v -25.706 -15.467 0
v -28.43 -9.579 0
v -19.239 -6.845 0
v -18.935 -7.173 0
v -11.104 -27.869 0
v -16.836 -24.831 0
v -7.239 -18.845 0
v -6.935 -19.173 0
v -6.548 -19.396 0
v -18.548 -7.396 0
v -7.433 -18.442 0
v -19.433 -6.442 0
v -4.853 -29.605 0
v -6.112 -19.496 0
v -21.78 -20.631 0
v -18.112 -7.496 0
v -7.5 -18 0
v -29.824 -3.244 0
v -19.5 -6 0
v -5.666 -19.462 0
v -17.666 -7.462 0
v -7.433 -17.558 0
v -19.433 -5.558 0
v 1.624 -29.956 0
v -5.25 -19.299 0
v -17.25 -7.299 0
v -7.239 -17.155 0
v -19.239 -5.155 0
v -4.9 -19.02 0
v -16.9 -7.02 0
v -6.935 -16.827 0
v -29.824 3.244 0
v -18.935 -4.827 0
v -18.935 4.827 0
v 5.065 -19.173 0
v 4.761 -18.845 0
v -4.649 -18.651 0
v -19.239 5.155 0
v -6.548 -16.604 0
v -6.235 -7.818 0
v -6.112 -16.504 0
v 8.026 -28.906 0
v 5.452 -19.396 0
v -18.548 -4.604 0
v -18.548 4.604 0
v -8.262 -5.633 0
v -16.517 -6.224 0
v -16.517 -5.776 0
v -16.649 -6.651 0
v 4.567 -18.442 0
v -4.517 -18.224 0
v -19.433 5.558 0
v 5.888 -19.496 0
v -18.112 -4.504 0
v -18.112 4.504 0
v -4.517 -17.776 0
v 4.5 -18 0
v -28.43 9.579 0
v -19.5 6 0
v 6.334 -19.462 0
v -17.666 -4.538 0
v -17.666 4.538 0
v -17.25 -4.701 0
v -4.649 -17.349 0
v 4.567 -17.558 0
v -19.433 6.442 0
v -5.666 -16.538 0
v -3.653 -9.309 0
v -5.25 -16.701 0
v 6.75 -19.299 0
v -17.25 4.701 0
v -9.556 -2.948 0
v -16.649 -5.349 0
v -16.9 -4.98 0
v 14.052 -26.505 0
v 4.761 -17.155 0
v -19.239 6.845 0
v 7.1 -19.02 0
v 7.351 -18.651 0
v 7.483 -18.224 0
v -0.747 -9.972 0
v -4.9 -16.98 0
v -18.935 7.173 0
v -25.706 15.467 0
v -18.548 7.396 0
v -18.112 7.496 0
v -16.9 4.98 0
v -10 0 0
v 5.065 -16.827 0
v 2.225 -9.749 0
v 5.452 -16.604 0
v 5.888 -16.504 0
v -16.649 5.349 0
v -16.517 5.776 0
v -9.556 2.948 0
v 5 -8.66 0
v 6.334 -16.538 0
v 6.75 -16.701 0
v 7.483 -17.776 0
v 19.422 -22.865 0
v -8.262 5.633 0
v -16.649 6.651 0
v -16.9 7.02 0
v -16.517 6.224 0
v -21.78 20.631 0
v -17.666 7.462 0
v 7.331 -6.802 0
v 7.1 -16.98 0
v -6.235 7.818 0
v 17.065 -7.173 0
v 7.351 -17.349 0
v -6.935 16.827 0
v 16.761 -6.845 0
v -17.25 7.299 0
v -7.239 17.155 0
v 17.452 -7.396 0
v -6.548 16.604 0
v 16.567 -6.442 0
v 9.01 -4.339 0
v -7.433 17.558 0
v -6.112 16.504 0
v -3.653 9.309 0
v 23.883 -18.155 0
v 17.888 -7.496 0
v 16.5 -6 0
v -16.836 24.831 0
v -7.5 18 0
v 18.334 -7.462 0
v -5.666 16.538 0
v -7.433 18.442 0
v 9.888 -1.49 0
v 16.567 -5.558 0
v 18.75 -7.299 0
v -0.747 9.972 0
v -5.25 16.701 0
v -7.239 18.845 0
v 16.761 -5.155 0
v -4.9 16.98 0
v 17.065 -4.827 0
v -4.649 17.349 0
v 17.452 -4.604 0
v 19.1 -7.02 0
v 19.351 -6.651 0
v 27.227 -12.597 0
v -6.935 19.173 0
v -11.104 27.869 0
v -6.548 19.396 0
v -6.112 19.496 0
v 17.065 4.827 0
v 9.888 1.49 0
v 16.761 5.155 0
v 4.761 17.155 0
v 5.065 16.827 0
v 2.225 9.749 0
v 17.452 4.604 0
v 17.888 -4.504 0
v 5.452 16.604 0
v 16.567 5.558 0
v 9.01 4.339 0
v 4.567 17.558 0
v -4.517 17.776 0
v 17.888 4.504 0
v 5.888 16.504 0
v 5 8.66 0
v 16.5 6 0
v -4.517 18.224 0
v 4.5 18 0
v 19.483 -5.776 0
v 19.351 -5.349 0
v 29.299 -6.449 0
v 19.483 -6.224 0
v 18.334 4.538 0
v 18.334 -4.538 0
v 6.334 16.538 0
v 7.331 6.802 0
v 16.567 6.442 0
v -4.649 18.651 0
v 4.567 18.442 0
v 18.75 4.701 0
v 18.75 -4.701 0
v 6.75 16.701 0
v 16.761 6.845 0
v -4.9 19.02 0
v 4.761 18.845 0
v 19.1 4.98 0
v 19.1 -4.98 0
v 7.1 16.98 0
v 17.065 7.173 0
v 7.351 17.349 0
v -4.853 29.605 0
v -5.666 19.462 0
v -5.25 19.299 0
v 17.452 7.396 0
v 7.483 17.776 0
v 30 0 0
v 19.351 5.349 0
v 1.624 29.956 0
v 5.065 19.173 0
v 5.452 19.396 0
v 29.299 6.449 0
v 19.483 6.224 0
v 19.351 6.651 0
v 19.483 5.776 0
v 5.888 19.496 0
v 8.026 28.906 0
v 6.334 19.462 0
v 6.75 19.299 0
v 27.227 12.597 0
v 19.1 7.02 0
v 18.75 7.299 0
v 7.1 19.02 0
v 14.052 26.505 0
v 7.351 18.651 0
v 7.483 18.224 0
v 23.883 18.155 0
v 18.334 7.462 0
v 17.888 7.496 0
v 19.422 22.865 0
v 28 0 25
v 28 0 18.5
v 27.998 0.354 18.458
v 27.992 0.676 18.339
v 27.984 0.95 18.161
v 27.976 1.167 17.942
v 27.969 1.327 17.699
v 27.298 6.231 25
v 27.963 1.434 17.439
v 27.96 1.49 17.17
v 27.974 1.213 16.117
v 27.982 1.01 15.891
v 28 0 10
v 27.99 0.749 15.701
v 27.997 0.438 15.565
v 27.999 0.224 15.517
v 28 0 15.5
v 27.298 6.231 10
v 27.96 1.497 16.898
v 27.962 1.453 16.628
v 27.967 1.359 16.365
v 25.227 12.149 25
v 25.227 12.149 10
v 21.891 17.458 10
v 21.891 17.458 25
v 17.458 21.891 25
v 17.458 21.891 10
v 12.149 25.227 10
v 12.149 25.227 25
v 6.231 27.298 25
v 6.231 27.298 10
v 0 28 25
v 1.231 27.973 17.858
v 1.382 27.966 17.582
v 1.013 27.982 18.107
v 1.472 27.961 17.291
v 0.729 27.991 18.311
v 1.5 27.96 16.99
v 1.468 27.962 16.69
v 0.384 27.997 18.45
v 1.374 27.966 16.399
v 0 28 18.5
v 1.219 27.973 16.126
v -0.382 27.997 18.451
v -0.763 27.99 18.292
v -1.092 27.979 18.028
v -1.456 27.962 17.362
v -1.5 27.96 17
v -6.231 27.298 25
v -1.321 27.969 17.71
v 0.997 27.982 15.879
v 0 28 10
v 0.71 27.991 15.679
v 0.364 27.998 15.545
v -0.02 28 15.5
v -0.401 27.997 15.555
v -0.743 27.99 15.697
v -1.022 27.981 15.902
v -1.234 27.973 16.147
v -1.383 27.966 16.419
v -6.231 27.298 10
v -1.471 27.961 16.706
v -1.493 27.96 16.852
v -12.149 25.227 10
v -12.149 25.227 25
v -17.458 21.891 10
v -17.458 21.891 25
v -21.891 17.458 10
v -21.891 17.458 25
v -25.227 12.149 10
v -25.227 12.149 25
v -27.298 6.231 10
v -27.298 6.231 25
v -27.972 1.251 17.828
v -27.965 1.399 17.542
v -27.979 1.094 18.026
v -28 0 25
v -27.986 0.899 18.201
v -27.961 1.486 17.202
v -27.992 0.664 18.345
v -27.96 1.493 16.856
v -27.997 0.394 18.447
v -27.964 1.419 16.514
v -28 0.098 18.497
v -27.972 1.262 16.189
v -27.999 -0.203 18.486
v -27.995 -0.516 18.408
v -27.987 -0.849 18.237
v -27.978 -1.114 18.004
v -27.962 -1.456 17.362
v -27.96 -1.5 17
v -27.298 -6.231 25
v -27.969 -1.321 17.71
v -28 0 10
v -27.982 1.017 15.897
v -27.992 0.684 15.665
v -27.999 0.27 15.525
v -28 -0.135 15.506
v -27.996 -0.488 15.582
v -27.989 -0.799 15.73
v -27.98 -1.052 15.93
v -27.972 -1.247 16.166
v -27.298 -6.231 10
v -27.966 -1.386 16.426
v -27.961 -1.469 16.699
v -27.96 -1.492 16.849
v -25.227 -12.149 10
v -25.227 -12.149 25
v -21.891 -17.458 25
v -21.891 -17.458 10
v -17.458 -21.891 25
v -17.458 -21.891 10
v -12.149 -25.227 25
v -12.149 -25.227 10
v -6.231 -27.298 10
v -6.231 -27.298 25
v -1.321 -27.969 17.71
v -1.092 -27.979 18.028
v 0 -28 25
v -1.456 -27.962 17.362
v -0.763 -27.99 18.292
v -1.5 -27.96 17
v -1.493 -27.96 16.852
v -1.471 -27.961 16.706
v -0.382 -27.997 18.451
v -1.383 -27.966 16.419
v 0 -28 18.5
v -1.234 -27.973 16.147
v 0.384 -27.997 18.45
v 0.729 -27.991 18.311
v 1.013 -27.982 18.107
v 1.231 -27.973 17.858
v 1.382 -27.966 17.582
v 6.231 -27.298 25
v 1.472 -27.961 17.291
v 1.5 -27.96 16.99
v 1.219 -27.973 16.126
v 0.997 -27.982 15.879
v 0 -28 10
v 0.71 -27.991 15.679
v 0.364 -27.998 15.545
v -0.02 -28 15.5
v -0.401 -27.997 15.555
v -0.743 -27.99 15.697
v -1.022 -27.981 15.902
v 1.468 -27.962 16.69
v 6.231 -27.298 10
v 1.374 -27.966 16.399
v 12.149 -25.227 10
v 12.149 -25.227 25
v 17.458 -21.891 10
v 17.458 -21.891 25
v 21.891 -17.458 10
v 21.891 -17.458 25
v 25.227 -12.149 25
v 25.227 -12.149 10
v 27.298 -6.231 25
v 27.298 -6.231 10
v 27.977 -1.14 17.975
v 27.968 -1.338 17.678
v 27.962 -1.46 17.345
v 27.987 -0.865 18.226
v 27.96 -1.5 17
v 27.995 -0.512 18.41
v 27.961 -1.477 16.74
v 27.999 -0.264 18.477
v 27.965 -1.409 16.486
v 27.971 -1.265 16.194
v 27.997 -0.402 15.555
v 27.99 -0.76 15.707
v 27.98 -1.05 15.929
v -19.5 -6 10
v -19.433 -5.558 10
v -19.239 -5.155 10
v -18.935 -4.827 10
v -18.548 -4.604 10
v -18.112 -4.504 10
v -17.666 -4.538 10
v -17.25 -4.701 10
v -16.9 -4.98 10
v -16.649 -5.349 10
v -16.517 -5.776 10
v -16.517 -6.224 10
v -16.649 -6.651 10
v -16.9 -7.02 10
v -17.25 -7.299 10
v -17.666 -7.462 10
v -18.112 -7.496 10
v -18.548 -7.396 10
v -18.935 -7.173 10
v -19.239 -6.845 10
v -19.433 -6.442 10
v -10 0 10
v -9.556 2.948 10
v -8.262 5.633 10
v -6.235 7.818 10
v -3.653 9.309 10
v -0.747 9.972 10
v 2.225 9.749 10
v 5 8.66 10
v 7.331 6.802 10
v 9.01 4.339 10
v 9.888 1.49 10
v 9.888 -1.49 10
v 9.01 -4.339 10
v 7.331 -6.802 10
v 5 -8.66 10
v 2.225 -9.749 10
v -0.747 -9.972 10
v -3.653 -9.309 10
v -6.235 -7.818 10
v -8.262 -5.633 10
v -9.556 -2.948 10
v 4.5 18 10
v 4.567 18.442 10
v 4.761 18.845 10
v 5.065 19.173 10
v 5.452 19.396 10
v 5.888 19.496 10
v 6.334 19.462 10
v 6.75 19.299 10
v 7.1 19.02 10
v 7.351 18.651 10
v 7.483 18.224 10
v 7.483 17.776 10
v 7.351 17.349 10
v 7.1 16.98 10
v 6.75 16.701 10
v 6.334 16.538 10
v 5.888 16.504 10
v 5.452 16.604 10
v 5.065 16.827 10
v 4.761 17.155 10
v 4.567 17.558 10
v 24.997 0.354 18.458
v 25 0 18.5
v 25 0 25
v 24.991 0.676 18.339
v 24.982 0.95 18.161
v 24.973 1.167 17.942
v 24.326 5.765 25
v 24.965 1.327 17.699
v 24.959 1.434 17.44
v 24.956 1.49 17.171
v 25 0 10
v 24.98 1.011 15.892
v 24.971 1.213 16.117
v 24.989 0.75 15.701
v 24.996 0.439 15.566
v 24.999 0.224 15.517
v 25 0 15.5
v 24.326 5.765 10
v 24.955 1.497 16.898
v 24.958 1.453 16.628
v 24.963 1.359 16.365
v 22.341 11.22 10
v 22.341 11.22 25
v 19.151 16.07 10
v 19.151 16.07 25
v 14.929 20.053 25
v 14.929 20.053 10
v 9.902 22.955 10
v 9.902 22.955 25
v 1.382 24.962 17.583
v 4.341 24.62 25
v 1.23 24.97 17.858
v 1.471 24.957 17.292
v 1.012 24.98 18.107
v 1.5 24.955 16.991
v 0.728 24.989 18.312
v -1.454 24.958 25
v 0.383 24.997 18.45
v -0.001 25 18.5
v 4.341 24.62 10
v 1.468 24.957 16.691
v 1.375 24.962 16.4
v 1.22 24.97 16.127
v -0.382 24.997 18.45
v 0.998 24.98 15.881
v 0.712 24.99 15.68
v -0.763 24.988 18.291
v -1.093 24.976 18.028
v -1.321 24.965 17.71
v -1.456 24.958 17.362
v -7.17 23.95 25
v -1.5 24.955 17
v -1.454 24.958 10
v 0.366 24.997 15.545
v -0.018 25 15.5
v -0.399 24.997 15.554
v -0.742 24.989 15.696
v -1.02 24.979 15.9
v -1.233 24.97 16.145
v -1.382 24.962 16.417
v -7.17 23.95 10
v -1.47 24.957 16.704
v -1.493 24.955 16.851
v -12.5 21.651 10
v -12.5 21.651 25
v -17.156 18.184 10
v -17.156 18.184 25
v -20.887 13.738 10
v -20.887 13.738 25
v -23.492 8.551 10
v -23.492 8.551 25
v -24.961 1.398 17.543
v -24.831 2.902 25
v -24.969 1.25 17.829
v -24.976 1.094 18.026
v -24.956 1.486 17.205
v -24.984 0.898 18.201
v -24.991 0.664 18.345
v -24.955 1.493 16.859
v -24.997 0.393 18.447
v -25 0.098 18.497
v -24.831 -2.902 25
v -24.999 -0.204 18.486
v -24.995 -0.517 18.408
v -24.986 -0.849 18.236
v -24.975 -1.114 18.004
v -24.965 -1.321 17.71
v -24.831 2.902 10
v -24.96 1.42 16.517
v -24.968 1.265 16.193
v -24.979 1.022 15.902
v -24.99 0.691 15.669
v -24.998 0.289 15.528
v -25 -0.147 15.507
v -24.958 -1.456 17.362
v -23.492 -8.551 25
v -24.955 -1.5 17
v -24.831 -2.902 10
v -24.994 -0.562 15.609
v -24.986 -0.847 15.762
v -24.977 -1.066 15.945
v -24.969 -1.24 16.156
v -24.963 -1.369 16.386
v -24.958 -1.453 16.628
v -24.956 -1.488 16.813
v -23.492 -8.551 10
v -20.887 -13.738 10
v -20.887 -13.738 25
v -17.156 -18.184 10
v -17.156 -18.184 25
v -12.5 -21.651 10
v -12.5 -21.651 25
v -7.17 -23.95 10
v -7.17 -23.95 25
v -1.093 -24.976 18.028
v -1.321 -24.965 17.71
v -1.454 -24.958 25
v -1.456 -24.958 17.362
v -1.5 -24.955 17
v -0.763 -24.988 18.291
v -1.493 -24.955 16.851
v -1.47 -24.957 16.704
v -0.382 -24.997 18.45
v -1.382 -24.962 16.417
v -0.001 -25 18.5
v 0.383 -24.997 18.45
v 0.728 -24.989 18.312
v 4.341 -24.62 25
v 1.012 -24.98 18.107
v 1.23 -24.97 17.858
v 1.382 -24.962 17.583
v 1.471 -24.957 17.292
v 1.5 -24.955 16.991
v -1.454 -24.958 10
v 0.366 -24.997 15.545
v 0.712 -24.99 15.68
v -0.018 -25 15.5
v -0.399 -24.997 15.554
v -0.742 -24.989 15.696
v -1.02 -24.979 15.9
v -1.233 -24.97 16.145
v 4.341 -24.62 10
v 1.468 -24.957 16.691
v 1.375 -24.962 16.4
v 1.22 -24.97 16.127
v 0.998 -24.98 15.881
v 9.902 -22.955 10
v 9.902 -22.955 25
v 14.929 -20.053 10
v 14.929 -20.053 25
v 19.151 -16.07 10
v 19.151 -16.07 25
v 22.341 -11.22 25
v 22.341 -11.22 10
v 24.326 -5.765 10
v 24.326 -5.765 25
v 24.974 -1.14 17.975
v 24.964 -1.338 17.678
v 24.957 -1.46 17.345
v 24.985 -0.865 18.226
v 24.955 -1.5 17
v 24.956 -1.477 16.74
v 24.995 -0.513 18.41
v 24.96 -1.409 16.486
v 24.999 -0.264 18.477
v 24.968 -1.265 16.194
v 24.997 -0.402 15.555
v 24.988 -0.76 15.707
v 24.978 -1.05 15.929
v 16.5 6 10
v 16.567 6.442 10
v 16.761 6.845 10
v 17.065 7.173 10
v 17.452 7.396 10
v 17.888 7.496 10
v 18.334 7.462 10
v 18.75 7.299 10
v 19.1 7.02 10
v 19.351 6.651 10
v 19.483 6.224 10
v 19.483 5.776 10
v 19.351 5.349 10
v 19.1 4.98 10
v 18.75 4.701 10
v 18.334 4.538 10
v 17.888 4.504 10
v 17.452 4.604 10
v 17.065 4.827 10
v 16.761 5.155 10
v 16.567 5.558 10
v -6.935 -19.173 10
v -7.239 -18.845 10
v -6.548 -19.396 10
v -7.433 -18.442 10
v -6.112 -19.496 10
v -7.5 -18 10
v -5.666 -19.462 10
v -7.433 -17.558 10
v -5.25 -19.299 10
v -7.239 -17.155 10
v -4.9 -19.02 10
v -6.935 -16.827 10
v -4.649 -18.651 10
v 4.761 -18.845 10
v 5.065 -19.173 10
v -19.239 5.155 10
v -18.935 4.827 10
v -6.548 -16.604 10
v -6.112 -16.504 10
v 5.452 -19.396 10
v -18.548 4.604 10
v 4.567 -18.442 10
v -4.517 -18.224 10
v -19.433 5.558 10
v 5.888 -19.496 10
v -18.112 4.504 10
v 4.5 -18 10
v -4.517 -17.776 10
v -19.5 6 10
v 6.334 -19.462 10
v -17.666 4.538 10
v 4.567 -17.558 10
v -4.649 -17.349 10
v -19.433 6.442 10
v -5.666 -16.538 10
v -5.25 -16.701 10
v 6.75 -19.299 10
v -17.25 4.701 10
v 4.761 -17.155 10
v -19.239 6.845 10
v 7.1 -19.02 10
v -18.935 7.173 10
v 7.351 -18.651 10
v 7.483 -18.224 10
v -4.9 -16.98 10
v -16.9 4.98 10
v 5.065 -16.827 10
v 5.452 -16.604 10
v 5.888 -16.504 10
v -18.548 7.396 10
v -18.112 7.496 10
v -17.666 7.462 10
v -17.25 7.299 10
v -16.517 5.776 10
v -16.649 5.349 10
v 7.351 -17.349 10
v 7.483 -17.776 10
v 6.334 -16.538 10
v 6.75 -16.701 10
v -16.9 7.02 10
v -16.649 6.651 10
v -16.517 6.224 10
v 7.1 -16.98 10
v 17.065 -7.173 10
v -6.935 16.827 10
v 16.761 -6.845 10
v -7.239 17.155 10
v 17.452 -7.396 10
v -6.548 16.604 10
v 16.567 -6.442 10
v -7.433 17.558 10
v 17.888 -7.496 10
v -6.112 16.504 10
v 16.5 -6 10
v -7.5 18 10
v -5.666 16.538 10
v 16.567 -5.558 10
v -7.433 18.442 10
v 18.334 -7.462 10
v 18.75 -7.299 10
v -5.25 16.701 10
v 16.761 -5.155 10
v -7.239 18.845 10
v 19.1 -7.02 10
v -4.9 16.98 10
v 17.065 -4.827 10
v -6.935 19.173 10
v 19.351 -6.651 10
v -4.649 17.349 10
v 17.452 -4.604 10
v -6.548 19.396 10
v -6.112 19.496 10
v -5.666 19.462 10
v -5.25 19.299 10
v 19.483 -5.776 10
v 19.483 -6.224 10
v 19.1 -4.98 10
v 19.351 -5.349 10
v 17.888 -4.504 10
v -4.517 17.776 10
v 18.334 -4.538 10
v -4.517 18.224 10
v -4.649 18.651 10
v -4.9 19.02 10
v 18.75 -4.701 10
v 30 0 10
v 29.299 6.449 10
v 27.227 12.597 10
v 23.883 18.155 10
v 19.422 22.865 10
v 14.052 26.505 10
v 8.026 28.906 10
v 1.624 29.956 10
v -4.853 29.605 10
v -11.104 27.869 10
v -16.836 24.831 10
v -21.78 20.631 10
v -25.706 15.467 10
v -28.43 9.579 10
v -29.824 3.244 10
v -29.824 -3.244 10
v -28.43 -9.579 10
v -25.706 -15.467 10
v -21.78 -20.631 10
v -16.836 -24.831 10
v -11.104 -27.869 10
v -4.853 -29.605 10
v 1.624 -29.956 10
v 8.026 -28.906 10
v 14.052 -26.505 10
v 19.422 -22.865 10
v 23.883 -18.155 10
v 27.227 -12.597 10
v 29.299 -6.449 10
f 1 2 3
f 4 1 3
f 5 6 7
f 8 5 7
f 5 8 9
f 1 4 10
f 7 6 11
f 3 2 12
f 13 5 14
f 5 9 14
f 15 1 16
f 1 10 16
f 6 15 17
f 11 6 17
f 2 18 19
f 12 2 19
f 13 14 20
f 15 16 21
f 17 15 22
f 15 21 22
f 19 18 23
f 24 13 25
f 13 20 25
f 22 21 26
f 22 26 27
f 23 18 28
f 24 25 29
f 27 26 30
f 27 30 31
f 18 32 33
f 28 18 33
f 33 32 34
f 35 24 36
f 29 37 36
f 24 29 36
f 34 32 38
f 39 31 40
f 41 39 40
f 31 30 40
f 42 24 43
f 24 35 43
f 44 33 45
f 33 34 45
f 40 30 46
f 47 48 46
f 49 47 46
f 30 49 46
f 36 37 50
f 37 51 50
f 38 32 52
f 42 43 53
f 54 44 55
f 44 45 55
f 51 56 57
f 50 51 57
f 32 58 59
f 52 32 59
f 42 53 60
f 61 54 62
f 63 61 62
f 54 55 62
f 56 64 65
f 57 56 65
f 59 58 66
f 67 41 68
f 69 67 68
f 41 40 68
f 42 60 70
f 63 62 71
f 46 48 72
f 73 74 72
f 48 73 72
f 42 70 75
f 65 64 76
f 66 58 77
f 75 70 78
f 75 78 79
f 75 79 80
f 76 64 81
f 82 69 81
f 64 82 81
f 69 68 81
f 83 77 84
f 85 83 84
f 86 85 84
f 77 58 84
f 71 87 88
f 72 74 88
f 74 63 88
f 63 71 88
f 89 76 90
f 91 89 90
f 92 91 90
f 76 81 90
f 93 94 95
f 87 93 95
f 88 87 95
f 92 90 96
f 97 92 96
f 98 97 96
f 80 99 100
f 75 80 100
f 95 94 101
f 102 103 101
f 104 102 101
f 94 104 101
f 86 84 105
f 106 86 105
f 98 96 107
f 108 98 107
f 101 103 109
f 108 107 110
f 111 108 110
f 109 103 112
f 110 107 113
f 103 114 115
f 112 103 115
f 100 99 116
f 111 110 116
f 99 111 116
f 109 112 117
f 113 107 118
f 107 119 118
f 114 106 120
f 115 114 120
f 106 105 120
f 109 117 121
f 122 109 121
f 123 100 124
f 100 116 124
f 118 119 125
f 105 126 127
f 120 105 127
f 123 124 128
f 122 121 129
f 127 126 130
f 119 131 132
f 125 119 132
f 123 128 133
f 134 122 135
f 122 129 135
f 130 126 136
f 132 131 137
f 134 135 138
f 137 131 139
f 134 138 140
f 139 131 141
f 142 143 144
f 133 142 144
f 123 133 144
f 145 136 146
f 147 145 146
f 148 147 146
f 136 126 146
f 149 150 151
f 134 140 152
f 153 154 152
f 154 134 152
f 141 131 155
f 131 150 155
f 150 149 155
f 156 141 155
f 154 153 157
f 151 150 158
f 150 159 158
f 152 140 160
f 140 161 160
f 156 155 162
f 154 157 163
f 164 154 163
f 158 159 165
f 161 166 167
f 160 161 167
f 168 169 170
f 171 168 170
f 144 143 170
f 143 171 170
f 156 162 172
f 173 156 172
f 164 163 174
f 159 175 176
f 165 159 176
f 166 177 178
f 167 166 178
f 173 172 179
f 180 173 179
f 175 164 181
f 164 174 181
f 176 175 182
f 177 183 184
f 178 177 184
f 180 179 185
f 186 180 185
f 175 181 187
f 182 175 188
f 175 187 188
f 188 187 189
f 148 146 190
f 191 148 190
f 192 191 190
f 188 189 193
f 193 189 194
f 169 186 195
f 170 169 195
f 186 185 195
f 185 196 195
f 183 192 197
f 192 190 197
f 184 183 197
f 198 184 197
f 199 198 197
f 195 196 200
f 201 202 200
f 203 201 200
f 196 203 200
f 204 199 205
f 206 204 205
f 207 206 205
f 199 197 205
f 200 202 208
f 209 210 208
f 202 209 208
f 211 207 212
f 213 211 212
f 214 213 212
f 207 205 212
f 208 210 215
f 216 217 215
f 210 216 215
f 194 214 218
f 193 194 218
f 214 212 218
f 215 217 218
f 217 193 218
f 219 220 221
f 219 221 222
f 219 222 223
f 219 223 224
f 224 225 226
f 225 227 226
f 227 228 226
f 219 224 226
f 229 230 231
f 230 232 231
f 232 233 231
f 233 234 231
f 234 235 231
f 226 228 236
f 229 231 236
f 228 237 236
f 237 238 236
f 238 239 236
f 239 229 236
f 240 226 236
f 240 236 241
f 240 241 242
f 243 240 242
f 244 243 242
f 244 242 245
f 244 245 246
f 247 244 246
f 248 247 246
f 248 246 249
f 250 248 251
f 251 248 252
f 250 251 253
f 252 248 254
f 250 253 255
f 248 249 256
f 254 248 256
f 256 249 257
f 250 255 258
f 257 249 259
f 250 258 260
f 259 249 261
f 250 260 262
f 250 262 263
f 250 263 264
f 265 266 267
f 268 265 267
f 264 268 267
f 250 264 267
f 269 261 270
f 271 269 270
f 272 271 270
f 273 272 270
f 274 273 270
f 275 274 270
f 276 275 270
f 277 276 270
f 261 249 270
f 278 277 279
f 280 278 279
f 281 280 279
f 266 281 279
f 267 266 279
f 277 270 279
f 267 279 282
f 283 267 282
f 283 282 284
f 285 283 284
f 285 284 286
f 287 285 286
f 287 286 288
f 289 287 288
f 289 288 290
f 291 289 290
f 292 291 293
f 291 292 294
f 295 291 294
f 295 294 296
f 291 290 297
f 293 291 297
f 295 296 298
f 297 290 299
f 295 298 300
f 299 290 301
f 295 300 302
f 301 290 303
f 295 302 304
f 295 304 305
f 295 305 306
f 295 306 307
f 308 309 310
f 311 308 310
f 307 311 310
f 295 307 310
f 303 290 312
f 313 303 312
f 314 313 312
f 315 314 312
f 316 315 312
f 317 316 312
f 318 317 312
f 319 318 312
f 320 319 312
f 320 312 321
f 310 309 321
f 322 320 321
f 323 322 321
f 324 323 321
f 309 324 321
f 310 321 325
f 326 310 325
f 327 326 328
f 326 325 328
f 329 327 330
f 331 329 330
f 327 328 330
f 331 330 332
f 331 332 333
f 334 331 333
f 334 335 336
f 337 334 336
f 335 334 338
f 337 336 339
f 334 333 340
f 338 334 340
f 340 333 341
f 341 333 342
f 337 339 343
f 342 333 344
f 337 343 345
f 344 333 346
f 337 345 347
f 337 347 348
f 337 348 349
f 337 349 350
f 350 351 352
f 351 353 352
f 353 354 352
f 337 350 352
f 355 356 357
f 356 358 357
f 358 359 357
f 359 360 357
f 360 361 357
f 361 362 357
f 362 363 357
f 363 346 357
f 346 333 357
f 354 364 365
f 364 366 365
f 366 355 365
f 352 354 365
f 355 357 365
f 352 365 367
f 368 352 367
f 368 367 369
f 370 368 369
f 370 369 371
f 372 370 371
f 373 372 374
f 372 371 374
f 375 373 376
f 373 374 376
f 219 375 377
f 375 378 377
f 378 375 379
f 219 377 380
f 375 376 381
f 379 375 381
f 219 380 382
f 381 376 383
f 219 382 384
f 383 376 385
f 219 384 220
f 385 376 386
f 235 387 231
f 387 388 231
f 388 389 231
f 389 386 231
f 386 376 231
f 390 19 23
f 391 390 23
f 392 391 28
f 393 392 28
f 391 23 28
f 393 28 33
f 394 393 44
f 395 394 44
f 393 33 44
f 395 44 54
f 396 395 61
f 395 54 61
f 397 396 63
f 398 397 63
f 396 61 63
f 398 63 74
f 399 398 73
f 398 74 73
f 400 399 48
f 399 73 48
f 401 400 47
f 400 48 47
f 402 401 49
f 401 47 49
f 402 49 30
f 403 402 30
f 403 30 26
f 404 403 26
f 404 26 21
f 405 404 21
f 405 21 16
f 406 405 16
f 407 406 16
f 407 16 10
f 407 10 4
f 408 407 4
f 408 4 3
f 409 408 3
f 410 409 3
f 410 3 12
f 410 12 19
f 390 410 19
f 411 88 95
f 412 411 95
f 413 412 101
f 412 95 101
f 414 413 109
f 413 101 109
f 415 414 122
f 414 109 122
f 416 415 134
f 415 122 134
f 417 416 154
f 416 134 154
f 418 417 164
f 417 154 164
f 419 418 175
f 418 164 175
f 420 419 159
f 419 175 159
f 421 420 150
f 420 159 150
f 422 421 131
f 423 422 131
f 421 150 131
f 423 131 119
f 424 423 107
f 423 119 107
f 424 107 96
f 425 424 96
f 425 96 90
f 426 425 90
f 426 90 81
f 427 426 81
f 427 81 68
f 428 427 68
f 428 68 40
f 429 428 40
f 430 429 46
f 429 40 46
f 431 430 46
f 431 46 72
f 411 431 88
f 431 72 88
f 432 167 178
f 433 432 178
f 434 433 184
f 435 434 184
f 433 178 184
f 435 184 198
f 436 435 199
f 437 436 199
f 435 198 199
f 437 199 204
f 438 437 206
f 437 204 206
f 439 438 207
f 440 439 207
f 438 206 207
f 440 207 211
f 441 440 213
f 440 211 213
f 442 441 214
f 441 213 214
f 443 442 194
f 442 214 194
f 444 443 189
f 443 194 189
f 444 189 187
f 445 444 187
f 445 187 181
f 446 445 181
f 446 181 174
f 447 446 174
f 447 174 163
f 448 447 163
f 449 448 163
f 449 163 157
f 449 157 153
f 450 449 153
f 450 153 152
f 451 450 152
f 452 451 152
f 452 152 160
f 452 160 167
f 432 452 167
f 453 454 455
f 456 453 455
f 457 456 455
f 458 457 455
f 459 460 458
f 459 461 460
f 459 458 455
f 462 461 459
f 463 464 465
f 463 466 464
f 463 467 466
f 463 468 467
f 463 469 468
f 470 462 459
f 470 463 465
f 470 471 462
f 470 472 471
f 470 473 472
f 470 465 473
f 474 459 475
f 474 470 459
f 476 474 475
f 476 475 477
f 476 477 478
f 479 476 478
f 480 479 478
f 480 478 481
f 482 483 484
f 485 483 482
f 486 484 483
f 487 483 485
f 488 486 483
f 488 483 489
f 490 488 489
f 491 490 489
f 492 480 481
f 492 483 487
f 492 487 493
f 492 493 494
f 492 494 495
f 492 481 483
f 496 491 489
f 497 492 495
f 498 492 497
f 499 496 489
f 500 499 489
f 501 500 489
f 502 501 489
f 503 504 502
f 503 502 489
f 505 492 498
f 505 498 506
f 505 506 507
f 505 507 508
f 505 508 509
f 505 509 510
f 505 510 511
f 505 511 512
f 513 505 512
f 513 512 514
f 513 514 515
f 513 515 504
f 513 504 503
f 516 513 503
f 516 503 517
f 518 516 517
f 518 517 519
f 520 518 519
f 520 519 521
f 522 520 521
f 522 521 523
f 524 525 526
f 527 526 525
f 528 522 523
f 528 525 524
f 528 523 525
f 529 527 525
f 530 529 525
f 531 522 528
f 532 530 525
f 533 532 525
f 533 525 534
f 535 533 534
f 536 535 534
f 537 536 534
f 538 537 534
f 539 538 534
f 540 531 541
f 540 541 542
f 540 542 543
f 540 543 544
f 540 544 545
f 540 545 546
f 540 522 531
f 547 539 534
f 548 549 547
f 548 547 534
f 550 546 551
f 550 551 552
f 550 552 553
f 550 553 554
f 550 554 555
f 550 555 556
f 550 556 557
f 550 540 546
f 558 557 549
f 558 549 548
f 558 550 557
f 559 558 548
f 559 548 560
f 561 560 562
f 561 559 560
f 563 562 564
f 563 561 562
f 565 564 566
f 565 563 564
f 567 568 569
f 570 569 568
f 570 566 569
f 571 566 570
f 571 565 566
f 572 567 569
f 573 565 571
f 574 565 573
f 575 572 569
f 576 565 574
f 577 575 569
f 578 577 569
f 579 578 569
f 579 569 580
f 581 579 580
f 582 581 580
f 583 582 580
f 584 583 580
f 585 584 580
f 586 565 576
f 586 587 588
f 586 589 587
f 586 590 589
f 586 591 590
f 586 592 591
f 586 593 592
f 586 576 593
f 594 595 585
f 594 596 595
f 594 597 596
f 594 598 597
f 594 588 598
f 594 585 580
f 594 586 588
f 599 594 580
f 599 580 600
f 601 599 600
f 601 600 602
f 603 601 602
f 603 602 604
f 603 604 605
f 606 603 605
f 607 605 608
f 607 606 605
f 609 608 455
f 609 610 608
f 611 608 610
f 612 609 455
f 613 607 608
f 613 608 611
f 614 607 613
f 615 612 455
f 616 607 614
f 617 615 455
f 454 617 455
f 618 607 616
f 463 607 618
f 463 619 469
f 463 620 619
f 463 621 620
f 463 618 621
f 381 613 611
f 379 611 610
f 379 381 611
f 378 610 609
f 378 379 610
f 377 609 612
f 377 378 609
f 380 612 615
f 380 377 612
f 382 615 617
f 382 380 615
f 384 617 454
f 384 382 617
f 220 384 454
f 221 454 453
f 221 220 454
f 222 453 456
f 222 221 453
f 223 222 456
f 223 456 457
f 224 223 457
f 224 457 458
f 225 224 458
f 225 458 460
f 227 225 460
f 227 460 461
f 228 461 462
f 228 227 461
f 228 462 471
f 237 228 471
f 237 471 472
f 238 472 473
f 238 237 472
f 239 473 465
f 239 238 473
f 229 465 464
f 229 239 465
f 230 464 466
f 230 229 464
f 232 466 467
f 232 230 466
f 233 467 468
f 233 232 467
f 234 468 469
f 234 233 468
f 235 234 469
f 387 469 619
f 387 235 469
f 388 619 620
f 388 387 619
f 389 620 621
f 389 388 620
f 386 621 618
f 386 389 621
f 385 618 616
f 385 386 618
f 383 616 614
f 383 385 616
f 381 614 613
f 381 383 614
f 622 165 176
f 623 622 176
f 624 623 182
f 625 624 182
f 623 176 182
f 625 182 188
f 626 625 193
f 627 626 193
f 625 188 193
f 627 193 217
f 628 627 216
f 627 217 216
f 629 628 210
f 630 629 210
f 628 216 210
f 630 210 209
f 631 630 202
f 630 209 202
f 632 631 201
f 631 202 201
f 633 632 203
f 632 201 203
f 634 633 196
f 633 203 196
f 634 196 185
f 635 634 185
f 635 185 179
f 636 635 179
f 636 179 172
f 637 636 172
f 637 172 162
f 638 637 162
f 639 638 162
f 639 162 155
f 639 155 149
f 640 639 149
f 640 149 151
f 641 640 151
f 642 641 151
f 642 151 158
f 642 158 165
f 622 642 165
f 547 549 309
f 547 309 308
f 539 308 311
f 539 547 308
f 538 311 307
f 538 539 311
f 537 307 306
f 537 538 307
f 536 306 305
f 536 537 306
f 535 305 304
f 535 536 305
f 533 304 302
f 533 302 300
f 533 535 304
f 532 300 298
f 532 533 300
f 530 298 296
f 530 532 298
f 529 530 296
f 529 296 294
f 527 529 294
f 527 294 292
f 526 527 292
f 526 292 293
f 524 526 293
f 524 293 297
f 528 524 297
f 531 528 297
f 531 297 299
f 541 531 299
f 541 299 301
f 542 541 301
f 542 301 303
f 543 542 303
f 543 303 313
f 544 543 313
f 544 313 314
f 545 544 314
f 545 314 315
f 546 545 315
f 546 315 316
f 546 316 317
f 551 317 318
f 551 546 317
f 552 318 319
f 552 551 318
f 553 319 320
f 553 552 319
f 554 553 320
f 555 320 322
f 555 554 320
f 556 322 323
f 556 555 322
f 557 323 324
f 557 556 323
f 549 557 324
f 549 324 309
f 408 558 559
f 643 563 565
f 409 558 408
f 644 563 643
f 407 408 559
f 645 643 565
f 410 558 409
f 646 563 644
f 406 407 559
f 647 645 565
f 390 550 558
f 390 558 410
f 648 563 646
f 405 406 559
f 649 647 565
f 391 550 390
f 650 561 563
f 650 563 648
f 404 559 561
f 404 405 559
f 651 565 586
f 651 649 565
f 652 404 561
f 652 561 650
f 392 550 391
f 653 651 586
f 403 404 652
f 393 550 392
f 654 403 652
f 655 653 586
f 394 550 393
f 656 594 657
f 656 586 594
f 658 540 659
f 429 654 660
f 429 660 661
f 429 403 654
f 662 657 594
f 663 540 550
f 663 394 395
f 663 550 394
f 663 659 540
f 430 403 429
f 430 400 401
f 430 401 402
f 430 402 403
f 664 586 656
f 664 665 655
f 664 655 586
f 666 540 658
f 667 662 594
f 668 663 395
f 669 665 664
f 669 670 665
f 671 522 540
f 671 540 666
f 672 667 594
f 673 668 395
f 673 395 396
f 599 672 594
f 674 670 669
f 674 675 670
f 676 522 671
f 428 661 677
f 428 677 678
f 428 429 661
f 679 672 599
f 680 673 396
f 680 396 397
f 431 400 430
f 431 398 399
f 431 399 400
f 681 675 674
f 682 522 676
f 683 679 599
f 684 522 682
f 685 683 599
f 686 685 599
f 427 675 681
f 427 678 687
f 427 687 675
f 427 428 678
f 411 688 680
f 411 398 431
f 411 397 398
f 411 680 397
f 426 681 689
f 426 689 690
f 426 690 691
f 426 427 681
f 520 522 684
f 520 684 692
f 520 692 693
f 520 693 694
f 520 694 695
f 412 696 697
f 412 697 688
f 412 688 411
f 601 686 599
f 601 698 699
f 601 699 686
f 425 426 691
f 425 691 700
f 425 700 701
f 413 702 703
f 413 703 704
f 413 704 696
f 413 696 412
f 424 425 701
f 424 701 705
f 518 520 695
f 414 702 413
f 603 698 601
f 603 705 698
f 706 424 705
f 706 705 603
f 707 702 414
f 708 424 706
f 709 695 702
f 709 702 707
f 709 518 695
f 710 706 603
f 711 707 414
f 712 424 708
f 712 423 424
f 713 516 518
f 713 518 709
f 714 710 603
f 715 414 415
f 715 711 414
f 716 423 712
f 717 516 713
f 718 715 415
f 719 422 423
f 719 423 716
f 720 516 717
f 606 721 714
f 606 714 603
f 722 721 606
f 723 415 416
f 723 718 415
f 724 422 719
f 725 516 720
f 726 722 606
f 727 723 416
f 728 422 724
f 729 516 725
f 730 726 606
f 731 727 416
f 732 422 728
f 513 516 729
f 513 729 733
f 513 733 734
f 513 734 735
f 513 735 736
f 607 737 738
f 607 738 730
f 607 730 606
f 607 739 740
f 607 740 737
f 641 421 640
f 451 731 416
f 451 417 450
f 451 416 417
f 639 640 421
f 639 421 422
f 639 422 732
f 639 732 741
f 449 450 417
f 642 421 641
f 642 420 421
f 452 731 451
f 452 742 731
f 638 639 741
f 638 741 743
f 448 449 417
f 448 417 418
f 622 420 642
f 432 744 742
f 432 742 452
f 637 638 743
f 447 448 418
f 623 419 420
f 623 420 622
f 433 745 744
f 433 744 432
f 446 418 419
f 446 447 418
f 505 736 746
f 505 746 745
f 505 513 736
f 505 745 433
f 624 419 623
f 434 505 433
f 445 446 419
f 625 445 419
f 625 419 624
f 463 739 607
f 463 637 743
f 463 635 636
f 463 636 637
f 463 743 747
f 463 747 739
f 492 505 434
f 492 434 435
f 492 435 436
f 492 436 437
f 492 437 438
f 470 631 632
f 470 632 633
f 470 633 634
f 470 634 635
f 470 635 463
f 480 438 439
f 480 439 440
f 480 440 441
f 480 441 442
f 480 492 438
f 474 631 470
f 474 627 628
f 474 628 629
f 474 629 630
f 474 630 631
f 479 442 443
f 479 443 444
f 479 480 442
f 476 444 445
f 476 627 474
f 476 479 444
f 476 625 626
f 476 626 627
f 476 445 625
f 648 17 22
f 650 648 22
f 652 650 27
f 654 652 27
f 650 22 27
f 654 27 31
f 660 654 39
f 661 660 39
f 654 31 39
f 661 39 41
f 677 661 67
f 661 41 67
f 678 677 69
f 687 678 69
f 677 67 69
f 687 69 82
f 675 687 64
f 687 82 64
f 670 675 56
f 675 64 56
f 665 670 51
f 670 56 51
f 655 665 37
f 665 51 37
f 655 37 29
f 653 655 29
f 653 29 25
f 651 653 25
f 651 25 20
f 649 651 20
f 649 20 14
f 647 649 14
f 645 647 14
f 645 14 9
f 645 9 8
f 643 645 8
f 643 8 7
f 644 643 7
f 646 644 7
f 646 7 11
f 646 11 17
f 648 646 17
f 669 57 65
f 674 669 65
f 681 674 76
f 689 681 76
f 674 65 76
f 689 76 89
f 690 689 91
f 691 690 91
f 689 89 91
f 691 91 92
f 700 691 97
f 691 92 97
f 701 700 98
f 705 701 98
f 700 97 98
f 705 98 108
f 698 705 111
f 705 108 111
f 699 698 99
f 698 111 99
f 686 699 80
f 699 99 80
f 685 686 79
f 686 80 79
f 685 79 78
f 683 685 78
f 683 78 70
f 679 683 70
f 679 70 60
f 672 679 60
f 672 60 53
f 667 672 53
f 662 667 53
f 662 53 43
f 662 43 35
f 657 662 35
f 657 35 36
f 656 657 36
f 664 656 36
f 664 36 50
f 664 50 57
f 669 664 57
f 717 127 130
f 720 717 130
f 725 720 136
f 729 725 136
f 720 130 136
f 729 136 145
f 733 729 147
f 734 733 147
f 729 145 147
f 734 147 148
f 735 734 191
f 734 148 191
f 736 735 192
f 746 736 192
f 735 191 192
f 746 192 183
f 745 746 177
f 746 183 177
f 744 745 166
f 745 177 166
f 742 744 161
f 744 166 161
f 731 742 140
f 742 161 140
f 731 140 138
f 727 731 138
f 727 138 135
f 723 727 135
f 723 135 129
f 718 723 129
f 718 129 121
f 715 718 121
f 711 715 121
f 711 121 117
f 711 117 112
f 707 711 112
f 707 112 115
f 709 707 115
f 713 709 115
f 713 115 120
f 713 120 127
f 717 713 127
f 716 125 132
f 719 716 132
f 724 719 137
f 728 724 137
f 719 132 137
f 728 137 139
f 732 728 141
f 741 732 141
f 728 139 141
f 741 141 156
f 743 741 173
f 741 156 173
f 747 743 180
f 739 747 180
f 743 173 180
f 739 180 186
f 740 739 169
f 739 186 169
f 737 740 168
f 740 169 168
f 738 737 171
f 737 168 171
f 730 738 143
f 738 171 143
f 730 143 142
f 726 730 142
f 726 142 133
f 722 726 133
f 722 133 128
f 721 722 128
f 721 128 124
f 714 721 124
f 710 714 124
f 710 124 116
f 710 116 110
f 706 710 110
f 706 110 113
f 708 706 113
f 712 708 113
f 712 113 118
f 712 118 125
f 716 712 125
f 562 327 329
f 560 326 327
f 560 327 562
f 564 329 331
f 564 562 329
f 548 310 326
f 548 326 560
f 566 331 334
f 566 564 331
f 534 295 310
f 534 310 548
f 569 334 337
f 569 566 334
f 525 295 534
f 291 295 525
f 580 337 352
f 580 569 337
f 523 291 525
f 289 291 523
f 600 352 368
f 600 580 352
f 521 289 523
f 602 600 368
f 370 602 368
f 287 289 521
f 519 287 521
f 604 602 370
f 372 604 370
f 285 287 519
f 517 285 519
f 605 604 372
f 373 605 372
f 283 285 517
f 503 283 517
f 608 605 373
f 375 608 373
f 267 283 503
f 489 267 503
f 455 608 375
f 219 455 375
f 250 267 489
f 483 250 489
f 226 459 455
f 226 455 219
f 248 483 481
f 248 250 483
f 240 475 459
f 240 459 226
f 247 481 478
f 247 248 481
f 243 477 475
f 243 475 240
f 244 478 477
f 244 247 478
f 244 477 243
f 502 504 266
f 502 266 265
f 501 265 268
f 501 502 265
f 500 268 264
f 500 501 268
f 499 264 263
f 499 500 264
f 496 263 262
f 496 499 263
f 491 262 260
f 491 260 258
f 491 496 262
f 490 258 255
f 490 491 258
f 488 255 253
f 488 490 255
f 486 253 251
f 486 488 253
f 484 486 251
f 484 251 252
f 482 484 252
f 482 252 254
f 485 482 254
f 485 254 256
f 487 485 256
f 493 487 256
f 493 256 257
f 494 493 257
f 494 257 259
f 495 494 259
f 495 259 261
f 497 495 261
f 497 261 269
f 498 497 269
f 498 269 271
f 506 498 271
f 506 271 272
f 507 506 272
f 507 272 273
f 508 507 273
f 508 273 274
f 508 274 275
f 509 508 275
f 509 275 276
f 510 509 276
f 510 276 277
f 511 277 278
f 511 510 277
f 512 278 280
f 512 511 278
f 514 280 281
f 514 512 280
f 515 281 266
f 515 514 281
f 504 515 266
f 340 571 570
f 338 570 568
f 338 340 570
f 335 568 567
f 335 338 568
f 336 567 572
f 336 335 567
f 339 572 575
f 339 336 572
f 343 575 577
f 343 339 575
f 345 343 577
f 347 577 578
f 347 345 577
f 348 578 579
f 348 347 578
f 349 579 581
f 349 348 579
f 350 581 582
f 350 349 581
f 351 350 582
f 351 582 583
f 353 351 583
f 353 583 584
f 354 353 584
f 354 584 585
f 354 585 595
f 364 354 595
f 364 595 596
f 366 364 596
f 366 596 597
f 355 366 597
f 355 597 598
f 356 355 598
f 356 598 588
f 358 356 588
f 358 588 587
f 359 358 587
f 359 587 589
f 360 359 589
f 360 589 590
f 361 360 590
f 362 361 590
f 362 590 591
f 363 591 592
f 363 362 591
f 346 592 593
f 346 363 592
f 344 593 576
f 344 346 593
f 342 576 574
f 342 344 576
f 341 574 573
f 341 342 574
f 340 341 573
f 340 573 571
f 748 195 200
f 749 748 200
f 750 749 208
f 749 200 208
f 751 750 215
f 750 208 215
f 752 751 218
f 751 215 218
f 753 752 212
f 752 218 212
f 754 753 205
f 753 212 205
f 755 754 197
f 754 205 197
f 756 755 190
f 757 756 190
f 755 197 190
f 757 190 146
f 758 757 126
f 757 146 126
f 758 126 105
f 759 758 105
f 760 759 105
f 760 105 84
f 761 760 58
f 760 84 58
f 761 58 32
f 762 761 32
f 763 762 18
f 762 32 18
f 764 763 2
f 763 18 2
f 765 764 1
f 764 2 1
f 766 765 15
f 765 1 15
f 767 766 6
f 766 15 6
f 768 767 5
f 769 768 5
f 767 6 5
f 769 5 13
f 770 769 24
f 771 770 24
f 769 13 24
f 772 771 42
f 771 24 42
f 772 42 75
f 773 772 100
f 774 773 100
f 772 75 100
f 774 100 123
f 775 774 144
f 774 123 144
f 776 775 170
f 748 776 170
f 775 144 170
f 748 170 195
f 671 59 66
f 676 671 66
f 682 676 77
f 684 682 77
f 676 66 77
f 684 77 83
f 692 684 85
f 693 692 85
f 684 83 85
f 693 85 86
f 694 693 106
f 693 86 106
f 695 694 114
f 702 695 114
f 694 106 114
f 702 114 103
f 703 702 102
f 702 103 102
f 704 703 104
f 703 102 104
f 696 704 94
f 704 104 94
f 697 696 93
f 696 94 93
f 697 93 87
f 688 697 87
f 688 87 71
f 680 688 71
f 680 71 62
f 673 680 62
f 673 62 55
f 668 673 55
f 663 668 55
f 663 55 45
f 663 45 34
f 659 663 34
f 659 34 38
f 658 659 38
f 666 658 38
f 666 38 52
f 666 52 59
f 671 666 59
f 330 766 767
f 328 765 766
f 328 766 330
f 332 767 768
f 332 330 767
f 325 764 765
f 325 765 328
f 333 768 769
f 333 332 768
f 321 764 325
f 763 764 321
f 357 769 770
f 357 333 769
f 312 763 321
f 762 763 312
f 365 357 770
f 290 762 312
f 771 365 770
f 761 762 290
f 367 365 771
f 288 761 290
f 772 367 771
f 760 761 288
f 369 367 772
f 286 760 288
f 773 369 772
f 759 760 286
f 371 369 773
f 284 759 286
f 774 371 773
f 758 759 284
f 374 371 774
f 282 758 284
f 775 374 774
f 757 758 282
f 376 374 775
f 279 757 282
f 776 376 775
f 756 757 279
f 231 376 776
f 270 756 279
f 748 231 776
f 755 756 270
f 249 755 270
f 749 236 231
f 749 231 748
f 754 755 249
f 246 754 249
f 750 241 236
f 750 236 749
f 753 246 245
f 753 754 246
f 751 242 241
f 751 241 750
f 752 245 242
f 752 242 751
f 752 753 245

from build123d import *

# Parameters (mm, degrees)
SKETCH_1_R               = 30
EXTRUDE_1_DEPTH          = 10
SKETCH_2_R               = 28
SKETCH_2_R_2             = 25
EXTRUDE_2_DEPTH          = 15
CUT_EXTRUDE_1_DEPTH      = 72.589105316
CUT_EXTRUDE_1_DEPTH_BACK = 72.589105316
SKETCH_3_R               = 1.5
CUT_EXTRUDE_2_DEPTH      = 70.094138717
CUT_EXTRUDE_2_DEPTH_BACK = 70.094138717
SKETCH_4_R               = 1.5
SKETCH_5_R               = 1.5
CUT_EXTRUDE_3_DEPTH      = 15
SKETCH_6_R               = 10
CUT_EXTRUDE_4_DEPTH      = 10


with BuildPart() as part:
    # 스케치1 → 보스-돌출1 (new body)
    with BuildSketch(Plane.XY):
        Circle(SKETCH_1_R)
    extrude(amount=EXTRUDE_1_DEPTH)

    # 스케치2 → 보스-돌출2 (add)
    with BuildSketch(Plane.XY.offset(10)):
        Circle(SKETCH_2_R)
        Circle(SKETCH_2_R_2, mode=Mode.SUBTRACT)
    extrude(amount=EXTRUDE_2_DEPTH)

    # 스케치3 → 컷-돌출1 (cut, two sides: drawn at the far end of the back side and taken through both)
    with BuildSketch(Plane(origin=(0, 30, 0), x_dir=(1, 0, 0), z_dir=(0, 1, 0)).offset(-CUT_EXTRUDE_1_DEPTH_BACK)):
        with Locations(Location((0, -17, 0), (0, 0, 180))):
            Circle(SKETCH_3_R)
    extrude(amount=CUT_EXTRUDE_1_DEPTH + CUT_EXTRUDE_1_DEPTH_BACK, mode=Mode.SUBTRACT)

    # 스케치4 → 컷-돌출2 (cut, two sides: drawn at the far end of the back side and taken through both)
    with BuildSketch(Plane.ZY.offset(27).offset(-CUT_EXTRUDE_2_DEPTH_BACK)):
        with Locations(Location((17, 0, 0), (0, 0, 270))):
            Circle(SKETCH_4_R)
    extrude(amount=CUT_EXTRUDE_2_DEPTH + CUT_EXTRUDE_2_DEPTH_BACK, mode=Mode.SUBTRACT)

    # 스케치5 → 컷-돌출3 (cut)
    with BuildSketch(Plane(origin=(0, 0, 0), x_dir=(-1, 0, 0), z_dir=(0, 0, -1))):
        with Locations((-6, -18)):
            Circle(SKETCH_5_R)
        with Locations((6, -18)):
            Circle(SKETCH_5_R)
        with Locations((18, -6)):
            Circle(SKETCH_5_R)
        with Locations((18, 6)):
            Circle(SKETCH_5_R)
        with Locations((6, 18)):
            Circle(SKETCH_5_R)
        with Locations((-6, 18)):
            Circle(SKETCH_5_R)
        with Locations((-18, 6)):
            Circle(SKETCH_5_R)
        with Locations((-18, -6)):
            Circle(SKETCH_5_R)
    extrude(amount=-CUT_EXTRUDE_3_DEPTH, mode=Mode.SUBTRACT)

    # 스케치6 → 컷-돌출4 (cut)
    with BuildSketch(Plane(origin=(0, 0, 0), x_dir=(-1, 0, 0), z_dir=(0, 0, -1))):
        Circle(SKETCH_6_R)
    extrude(amount=-CUT_EXTRUDE_4_DEPTH, mode=Mode.SUBTRACT)


solid = part.part
